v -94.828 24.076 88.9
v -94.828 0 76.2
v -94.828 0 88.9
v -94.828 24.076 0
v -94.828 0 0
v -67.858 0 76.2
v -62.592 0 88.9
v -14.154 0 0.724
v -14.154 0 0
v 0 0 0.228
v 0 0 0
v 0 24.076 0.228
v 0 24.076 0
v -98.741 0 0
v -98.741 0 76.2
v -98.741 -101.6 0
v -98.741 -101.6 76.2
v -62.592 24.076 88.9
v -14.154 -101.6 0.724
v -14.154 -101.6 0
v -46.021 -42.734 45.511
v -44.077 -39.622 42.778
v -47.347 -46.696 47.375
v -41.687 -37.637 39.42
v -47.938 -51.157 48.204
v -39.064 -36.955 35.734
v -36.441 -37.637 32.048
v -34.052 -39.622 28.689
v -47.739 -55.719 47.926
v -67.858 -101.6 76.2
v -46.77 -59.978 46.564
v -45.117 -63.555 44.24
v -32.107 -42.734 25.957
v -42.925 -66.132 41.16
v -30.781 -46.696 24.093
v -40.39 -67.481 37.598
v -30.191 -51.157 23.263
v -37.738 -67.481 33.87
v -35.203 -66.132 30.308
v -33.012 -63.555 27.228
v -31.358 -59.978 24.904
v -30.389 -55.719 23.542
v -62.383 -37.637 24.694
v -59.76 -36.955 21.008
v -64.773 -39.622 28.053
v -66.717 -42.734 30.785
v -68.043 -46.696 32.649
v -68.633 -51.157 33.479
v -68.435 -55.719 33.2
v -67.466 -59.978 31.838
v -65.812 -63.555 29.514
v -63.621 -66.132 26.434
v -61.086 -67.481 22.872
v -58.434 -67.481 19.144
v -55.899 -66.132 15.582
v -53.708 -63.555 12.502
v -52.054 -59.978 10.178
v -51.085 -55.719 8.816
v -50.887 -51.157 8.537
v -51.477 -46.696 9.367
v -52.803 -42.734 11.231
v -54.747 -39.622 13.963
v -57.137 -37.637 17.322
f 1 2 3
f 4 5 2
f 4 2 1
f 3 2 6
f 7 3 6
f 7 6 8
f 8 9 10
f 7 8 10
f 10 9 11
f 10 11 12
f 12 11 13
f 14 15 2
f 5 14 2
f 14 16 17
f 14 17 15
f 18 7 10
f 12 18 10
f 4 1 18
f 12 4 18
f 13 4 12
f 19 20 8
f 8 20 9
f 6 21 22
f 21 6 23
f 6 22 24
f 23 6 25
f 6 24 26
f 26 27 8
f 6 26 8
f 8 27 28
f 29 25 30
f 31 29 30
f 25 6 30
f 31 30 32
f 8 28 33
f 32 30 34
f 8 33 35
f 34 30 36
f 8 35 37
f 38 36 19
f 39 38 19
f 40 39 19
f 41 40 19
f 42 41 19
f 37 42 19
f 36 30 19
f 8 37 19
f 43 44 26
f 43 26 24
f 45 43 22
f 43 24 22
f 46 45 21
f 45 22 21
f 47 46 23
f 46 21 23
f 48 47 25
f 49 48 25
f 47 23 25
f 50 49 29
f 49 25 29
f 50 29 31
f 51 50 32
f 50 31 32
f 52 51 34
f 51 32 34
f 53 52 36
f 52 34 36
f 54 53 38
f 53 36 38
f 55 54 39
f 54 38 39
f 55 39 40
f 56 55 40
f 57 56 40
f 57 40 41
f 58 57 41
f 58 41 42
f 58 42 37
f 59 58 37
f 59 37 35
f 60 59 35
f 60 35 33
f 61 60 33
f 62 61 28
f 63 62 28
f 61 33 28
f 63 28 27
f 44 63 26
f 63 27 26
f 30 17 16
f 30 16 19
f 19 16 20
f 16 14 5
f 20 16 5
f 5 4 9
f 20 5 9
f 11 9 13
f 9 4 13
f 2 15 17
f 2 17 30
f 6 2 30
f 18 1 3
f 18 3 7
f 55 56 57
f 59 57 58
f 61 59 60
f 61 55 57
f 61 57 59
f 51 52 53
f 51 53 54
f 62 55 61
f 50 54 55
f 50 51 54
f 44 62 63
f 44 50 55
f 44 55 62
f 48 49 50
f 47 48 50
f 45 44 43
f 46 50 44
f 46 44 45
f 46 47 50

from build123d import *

# Parameters (mm, degrees)
F0_W     = 94.8279574513
F0_H     = 24.0764599293
F1_DEPTH = 88.9
F3_DEPTH = 49.022
F4_W     = 84.5879163432
F4_H     = 101.6
F5_DEPTH = 76.2
F7_DEPTH = 101.6
F8_R     = 15.3482733218
F9_DEPTH = 25.4


with BuildPart() as f1:
    # F0 (on Top) → F1 (new body)
    with BuildSketch(Plane.XY):
        with Locations((-47.4139787257, 12.0382299647)):
            Rectangle(F0_W, F0_H)
    extrude(amount=F1_DEPTH)

    # F2 (on face) → F3 (cut)
    with BuildSketch(Plane.XZ):
        Polygon((0, 88.9), (-62.5919832129, 88.9), (0, 0.2280238973), align=None)
    extrude(amount=-F3_DEPTH, mode=Mode.SUBTRACT)

    # F4 (on Top) → F5 (join)
    with BuildSketch(Plane.XY):
        with Locations((-56.447530406, -50.8)):
            Rectangle(F4_W, F4_H)
    extrude(amount=F5_DEPTH)

    # F6 (on face) → F7 (cut)
    with BuildSketch(Plane.XZ.offset(101.6)):
        Polygon((-14.1535722344, 76.2), (-67.8575116148, 76.2), (-14.1535722344, 0.7241950249), align=None)
    extrude(amount=-F7_DEPTH, mode=Mode.SUBTRACT)

    # F8 (on face) → F9 (cut)
    with BuildSketch(Plane(origin=(-9.054237048, 0, -6.4424380465), x_dir=(0, 1, 0), z_dir=(0.814790835, 0, 0.5797550304))):
        with Locations((-52.3036755621, 51.7632775009)):
            Circle(F8_R)
    extrude(amount=-F9_DEPTH, mode=Mode.SUBTRACT)


solid = f1.part
